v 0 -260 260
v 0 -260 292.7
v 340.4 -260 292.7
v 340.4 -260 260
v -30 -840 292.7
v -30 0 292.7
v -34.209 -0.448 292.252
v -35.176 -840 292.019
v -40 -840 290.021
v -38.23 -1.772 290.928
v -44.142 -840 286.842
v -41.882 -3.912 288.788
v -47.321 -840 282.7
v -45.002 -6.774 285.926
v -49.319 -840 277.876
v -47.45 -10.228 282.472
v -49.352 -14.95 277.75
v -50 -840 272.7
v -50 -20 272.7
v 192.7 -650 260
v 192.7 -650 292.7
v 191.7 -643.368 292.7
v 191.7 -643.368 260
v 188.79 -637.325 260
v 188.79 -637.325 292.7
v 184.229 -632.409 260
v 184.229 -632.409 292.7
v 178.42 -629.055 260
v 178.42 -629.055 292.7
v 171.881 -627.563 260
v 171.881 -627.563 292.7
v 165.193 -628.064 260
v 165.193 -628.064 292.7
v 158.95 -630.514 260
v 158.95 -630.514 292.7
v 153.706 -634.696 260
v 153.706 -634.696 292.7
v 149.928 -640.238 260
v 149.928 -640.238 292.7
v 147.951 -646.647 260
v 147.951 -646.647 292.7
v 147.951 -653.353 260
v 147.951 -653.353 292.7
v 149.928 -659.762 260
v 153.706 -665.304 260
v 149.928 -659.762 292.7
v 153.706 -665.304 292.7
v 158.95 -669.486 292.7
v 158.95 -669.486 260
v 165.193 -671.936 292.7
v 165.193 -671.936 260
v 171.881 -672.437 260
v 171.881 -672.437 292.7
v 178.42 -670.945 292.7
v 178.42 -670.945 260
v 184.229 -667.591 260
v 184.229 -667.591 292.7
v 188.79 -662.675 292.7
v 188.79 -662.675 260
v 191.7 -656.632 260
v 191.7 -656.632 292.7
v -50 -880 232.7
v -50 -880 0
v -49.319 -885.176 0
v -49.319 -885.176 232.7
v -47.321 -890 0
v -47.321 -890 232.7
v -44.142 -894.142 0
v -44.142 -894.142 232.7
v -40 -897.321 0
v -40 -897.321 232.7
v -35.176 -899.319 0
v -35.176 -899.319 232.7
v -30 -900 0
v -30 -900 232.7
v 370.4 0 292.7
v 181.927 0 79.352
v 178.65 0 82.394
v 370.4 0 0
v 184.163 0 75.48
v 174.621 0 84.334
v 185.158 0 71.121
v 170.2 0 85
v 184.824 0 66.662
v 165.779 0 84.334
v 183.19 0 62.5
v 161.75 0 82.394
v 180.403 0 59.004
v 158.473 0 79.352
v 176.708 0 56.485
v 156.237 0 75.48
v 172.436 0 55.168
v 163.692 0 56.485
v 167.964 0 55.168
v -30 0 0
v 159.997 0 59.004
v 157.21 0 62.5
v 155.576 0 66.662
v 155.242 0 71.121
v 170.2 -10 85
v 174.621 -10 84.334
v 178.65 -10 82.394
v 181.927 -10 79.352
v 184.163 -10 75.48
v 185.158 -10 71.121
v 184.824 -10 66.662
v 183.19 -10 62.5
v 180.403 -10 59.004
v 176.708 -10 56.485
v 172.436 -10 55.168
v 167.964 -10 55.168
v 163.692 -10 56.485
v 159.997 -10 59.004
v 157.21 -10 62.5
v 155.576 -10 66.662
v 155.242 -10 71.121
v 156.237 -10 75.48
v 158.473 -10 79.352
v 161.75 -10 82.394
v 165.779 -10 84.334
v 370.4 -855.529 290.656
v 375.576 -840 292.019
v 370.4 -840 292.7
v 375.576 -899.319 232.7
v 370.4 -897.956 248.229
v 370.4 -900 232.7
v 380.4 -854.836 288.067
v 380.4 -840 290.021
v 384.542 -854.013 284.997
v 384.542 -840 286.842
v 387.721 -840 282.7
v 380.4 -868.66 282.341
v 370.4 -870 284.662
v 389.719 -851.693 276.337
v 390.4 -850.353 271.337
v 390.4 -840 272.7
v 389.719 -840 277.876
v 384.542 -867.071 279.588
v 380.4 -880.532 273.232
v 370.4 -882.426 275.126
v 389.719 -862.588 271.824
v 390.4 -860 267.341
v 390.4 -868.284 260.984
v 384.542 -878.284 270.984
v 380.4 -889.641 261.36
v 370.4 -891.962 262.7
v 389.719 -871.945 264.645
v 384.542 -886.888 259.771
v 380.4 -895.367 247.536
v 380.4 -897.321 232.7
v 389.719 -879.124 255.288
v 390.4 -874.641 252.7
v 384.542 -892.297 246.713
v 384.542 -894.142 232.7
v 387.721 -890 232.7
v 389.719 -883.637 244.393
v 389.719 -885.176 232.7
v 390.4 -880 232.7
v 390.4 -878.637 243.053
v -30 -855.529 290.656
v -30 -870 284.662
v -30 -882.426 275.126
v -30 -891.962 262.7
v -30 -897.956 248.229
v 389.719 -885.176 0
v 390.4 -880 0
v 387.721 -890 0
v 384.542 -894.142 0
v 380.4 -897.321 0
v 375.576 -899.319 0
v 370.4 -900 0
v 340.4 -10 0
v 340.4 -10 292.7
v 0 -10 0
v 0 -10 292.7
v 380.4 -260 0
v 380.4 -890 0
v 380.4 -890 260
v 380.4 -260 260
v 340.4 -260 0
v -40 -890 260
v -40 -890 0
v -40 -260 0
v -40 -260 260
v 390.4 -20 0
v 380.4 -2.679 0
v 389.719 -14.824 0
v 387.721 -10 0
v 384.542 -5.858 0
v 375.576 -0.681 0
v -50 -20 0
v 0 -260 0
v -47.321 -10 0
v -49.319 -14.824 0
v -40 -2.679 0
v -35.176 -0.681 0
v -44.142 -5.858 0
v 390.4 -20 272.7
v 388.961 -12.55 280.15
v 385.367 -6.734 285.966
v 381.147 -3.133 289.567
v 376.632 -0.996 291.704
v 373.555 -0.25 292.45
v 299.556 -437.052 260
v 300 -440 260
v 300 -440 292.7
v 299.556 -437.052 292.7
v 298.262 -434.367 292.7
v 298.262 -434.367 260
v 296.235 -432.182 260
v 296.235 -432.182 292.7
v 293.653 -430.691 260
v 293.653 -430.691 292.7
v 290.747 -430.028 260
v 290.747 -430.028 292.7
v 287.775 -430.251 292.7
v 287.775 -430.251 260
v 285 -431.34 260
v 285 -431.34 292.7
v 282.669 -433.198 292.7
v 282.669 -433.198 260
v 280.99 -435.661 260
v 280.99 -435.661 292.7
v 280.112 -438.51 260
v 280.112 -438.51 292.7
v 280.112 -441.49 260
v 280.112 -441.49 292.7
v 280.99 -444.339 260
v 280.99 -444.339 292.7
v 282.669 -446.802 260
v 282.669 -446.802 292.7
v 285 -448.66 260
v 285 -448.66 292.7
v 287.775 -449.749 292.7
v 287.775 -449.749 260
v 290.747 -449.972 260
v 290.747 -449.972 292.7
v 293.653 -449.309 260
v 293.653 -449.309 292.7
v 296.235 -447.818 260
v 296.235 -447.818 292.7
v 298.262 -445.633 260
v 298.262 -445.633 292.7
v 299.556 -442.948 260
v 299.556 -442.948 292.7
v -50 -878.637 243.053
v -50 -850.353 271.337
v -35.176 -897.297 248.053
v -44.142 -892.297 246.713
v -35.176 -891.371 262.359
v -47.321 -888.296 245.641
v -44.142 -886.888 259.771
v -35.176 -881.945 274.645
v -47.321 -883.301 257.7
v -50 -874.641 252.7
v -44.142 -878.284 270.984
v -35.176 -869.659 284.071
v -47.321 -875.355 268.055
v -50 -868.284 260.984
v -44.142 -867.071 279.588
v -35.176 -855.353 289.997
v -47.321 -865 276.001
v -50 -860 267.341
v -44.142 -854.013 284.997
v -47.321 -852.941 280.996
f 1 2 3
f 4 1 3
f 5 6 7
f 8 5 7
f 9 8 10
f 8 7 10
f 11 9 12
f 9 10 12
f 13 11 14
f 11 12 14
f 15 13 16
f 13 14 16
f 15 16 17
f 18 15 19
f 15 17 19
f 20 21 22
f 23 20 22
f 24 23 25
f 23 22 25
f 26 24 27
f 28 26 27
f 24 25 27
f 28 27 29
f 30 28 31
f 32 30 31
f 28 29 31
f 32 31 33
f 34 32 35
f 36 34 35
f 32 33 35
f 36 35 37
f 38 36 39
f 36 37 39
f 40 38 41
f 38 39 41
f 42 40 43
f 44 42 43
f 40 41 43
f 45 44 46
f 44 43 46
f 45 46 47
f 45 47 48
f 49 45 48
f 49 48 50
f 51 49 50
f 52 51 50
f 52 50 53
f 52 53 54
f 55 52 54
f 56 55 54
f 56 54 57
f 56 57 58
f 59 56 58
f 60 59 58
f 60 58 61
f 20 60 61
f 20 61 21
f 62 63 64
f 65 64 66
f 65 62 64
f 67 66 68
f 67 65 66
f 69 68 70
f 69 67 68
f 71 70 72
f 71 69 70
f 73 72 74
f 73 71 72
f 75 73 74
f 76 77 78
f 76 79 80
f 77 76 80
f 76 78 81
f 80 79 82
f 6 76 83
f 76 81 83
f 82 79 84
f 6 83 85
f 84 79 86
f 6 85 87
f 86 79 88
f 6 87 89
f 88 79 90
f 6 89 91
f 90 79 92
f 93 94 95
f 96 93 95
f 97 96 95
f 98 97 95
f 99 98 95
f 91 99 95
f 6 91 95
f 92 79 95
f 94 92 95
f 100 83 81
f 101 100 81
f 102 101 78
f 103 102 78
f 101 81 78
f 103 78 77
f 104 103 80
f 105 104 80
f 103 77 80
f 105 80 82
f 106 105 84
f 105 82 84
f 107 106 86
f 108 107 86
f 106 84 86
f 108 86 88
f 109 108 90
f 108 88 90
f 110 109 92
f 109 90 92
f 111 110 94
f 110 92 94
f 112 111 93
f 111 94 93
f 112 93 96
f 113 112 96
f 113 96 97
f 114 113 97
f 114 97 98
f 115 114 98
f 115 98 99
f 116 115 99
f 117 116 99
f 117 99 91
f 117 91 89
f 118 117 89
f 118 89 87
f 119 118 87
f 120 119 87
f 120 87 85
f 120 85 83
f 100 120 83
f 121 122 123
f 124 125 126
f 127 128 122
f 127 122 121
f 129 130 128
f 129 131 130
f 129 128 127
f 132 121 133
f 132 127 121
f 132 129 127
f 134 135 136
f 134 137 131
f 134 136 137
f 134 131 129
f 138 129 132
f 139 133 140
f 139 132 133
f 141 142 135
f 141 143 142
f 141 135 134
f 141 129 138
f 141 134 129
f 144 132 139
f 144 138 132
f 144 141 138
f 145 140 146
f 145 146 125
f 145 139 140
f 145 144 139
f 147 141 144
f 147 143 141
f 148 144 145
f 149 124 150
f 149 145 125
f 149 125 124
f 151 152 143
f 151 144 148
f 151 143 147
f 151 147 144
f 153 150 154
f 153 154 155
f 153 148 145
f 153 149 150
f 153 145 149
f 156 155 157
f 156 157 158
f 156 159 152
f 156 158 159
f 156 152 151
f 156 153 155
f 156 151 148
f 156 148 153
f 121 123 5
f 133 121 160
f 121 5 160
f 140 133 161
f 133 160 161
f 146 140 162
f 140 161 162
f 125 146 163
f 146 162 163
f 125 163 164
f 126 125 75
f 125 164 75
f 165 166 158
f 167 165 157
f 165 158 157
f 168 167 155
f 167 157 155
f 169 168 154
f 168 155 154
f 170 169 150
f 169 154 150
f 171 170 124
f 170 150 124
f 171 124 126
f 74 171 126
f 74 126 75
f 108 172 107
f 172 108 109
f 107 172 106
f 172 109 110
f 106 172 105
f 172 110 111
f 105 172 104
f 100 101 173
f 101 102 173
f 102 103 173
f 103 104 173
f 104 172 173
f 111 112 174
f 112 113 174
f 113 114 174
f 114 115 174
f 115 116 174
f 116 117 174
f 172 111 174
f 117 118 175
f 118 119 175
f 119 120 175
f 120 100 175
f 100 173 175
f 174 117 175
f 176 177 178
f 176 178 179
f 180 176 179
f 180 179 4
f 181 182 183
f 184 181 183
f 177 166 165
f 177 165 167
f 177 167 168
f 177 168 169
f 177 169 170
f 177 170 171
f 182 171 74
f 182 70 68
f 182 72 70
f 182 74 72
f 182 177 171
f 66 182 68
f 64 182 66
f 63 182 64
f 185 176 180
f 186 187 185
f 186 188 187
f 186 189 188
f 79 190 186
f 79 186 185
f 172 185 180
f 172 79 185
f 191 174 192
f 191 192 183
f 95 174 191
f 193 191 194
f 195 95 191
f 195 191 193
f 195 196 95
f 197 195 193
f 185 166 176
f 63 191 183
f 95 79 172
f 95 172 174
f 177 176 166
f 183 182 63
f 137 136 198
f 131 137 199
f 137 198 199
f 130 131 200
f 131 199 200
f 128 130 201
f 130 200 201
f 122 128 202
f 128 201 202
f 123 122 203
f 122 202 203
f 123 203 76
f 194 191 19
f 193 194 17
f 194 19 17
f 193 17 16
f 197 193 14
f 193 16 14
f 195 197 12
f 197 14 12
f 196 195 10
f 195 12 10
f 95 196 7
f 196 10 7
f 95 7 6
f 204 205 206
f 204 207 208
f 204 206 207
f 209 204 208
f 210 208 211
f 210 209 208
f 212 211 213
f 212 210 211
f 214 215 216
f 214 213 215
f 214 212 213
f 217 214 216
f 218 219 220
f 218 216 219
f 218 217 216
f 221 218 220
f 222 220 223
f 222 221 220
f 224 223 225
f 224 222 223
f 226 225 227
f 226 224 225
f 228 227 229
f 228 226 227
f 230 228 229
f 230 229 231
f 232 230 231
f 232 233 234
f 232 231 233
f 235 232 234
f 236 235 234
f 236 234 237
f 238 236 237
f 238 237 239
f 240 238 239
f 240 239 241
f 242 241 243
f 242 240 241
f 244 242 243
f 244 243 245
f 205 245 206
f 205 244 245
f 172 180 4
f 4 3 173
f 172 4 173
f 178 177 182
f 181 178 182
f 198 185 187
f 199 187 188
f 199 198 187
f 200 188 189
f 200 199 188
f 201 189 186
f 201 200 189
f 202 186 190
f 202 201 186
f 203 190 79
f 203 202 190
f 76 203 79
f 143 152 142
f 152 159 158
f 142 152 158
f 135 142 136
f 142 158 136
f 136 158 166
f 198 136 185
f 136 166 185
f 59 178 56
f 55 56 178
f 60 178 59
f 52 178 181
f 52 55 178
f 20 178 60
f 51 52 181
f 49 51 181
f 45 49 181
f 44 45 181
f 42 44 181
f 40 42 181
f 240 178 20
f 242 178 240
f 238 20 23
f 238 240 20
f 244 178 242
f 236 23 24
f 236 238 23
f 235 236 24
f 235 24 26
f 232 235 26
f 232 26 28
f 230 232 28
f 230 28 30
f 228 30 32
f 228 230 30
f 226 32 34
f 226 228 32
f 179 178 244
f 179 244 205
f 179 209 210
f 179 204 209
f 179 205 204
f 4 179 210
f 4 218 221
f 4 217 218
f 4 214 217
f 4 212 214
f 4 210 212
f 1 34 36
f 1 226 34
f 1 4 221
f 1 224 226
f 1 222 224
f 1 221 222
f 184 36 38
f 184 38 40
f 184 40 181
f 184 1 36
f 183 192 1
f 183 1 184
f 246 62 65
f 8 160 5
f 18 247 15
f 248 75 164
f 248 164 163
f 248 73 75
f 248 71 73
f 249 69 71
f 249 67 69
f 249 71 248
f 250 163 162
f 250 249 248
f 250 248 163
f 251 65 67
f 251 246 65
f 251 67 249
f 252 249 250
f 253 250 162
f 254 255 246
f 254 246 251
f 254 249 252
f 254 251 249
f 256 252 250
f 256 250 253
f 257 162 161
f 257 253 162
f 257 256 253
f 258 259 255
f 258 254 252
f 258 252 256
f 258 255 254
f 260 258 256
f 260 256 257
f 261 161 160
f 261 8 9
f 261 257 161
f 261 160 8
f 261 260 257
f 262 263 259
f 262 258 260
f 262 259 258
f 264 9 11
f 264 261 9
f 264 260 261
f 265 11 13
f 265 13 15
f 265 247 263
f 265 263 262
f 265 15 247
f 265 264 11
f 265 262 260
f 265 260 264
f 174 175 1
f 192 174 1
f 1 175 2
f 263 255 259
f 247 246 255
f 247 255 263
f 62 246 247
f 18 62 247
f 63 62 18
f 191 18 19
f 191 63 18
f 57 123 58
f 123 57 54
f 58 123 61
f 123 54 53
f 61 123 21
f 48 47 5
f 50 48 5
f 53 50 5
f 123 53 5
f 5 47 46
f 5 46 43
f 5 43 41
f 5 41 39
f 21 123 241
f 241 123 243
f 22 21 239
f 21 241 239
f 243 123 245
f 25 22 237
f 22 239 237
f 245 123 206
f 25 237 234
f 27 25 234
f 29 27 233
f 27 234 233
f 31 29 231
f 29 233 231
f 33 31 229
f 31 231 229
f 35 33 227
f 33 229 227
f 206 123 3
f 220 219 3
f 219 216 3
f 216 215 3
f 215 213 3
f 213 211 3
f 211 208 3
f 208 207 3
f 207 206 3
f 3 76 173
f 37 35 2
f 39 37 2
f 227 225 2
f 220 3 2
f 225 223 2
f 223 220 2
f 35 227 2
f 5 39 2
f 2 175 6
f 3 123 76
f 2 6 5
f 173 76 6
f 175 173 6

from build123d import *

# Parameters (mm, degrees)
SKETCH_1_W               = 340.4
SKETCH_1_H               = 900
EXTRUDE_1_DEPTH          = 292.7
SKETCH_2_R               = 22.5
CUT_EXTRUDE_1_DEPTH      = 1006.756158321
SKETCH_3_W               = 50
SKETCH_3_H               = 900
EXTRUDE_2_DEPTH          = 292.7
FILLET_9_R               = 20
FILLET_10_R              = 60
CUT_EXTRUDE_3_DEPTH      = 1024.760445612
CUT_EXTRUDE_3_DEPTH_BACK = 1024.760445612
SKETCH_5_R               = 10
CUT_EXTRUDE_4_REACH      = 1025.76
CUT_EXTRUDE_4_END_RADIUS = 22.5
SKETCH_6_R               = 15
SKETCH_7_W               = 420.4
SKETCH_7_H               = 630
CUT_EXTRUDE_6_DEPTH      = 260
CUT_EXTRUDE_7_DEPTH      = 1024.760445612


with BuildPart() as part:
    # 草图1 → 凸台-拉伸1 (new body)
    with BuildSketch(Plane.XY):
        with Locations((170.2, -450)):
            Rectangle(SKETCH_1_W, SKETCH_1_H)
    extrude(amount=EXTRUDE_1_DEPTH)

    # 草图2 → 切除-拉伸1 (cut, through all)
    with BuildSketch(Plane.XY.offset(292.7)):
        with Locations((170.2, -650)):
            Circle(SKETCH_2_R)
    extrude(amount=-CUT_EXTRUDE_1_DEPTH, mode=Mode.SUBTRACT)

    # 草图3 → 凸台-拉伸2 (add)
    with BuildSketch(Plane(origin=(0, 0, 0), x_dir=(-1, 0, 0), z_dir=(0, 0, -1))):
        with Locations((-365.4, -450)):
            Rectangle(SKETCH_3_W, SKETCH_3_H)
        with Locations((25, -450)):
            Rectangle(SKETCH_3_W, SKETCH_3_H)
    extrude(amount=-EXTRUDE_2_DEPTH)

    # 圆角9
    fillet_9_edges = [part.edges().sort_by_distance(p)[0] for p in [
        (390.4, -450, 292.7),
        (390.4, -900, 146.35),
        (390.4, 0, 146.35),
        (-50, -450, 292.7),
        (-50, 0, 146.35),
        (-50, -900, 146.35),
    ]]
    fillet(fillet_9_edges, radius=FILLET_9_R)

    # 圆角10
    # the kernel refuses this fillet: 60 mm, written as the material it takes off along each edge
    with BuildSketch(Plane(origin=(390.4, -840, 232.7), x_dir=(0, 0, 1), z_dir=(0, 1, 0))) as fillet_10_piece_1:
        with BuildLine():
            CenterArc((40, -20), 20, 0, 90)
            Line((60, -20), (60, 0))
            Line((60, 0), (40, 0))
        make_face()
    revolve(axis=Axis((390.4, -840, 232.7), (1, 0, 0)), revolution_arc=90, mode=Mode.SUBTRACT)
    with BuildSketch(Plane(origin=(-50, -840, 232.7), x_dir=(0, -1, 0), z_dir=(0, 0, -1))) as fillet_10_piece_2:
        with BuildLine():
            CenterArc((40, -20), 20, 0, 90)
            Line((60, -20), (60, 0))
            Line((60, 0), (40, 0))
        make_face()
    revolve(axis=Axis((-50, -840, 232.7), (-1, 0, 0)), revolution_arc=90, mode=Mode.SUBTRACT)
    with BuildSketch(Plane(origin=(-50, -900, 292.7), x_dir=(0, 1, 0), z_dir=(1, 0, 0))) as fillet_10_piece_3:
        with BuildLine():
            CenterArc((FILLET_10_R, -FILLET_10_R), FILLET_10_R, 90, 90)
            Line((0, -FILLET_10_R), (0, 0))
            Line((0, 0), (FILLET_10_R, 0))
        make_face()
    extrude(amount=440.4, mode=Mode.SUBTRACT)

    # 草图5 → 切除-拉伸3 (cut, two sides: drawn at the far end of the back side and taken through both)
    with BuildSketch(Plane.XY.offset(292.7).offset(-CUT_EXTRUDE_3_DEPTH_BACK)):
        with Locations((290, -440)):
            Circle(SKETCH_5_R)
    extrude(amount=CUT_EXTRUDE_3_DEPTH + CUT_EXTRUDE_3_DEPTH_BACK, mode=Mode.SUBTRACT)

    # 切除-拉伸4: up to this cylinder (the profile starts outside it)
    cut_extrude_4_end = Plane(origin=(170.2, -650, 70), z_dir=(0, 0, 1)) * Cylinder(CUT_EXTRUDE_4_END_RADIUS, 2097.52, mode=Mode.PRIVATE)
    # 草图6 → 切除-拉伸4 (cut, up to the surface)
    with BuildSketch(Plane(origin=(0, 0, 0), x_dir=(1, 0, 0), z_dir=(0, 1, 0)), mode=Mode.PRIVATE) as cut_extrude_4_sk1:
        with Locations(Location((170.2, -70, 0), (0, 0, 270))):
            Circle(SKETCH_6_R)
    cut_extrude_4_tool1 = extrude(cut_extrude_4_sk1.sketch, amount=-CUT_EXTRUDE_4_REACH, mode=Mode.PRIVATE) - cut_extrude_4_end
    add(cut_extrude_4_tool1.solids().sort_by_distance((170.2, 0, 70))[0], mode=Mode.SUBTRACT)

    # 草图7 → 切除-拉伸6 (cut)
    with BuildSketch(Plane(origin=(0, 0, 0), x_dir=(-1, 0, 0), z_dir=(0, 0, -1))):
        with Locations((-170.2, -575)):
            Rectangle(SKETCH_7_W, SKETCH_7_H)
    extrude(amount=-CUT_EXTRUDE_6_DEPTH, mode=Mode.SUBTRACT)

    # 草图8 → 切除-拉伸7 (cut, through all)
    with BuildSketch(Plane.XY.offset(292.7)):
        Polygon((170.2, -10), (0, -10), (0, -260), (340.4, -260), (340.4, -10), align=None)
    extrude(amount=-CUT_EXTRUDE_7_DEPTH, mode=Mode.SUBTRACT)


solid = part.part
